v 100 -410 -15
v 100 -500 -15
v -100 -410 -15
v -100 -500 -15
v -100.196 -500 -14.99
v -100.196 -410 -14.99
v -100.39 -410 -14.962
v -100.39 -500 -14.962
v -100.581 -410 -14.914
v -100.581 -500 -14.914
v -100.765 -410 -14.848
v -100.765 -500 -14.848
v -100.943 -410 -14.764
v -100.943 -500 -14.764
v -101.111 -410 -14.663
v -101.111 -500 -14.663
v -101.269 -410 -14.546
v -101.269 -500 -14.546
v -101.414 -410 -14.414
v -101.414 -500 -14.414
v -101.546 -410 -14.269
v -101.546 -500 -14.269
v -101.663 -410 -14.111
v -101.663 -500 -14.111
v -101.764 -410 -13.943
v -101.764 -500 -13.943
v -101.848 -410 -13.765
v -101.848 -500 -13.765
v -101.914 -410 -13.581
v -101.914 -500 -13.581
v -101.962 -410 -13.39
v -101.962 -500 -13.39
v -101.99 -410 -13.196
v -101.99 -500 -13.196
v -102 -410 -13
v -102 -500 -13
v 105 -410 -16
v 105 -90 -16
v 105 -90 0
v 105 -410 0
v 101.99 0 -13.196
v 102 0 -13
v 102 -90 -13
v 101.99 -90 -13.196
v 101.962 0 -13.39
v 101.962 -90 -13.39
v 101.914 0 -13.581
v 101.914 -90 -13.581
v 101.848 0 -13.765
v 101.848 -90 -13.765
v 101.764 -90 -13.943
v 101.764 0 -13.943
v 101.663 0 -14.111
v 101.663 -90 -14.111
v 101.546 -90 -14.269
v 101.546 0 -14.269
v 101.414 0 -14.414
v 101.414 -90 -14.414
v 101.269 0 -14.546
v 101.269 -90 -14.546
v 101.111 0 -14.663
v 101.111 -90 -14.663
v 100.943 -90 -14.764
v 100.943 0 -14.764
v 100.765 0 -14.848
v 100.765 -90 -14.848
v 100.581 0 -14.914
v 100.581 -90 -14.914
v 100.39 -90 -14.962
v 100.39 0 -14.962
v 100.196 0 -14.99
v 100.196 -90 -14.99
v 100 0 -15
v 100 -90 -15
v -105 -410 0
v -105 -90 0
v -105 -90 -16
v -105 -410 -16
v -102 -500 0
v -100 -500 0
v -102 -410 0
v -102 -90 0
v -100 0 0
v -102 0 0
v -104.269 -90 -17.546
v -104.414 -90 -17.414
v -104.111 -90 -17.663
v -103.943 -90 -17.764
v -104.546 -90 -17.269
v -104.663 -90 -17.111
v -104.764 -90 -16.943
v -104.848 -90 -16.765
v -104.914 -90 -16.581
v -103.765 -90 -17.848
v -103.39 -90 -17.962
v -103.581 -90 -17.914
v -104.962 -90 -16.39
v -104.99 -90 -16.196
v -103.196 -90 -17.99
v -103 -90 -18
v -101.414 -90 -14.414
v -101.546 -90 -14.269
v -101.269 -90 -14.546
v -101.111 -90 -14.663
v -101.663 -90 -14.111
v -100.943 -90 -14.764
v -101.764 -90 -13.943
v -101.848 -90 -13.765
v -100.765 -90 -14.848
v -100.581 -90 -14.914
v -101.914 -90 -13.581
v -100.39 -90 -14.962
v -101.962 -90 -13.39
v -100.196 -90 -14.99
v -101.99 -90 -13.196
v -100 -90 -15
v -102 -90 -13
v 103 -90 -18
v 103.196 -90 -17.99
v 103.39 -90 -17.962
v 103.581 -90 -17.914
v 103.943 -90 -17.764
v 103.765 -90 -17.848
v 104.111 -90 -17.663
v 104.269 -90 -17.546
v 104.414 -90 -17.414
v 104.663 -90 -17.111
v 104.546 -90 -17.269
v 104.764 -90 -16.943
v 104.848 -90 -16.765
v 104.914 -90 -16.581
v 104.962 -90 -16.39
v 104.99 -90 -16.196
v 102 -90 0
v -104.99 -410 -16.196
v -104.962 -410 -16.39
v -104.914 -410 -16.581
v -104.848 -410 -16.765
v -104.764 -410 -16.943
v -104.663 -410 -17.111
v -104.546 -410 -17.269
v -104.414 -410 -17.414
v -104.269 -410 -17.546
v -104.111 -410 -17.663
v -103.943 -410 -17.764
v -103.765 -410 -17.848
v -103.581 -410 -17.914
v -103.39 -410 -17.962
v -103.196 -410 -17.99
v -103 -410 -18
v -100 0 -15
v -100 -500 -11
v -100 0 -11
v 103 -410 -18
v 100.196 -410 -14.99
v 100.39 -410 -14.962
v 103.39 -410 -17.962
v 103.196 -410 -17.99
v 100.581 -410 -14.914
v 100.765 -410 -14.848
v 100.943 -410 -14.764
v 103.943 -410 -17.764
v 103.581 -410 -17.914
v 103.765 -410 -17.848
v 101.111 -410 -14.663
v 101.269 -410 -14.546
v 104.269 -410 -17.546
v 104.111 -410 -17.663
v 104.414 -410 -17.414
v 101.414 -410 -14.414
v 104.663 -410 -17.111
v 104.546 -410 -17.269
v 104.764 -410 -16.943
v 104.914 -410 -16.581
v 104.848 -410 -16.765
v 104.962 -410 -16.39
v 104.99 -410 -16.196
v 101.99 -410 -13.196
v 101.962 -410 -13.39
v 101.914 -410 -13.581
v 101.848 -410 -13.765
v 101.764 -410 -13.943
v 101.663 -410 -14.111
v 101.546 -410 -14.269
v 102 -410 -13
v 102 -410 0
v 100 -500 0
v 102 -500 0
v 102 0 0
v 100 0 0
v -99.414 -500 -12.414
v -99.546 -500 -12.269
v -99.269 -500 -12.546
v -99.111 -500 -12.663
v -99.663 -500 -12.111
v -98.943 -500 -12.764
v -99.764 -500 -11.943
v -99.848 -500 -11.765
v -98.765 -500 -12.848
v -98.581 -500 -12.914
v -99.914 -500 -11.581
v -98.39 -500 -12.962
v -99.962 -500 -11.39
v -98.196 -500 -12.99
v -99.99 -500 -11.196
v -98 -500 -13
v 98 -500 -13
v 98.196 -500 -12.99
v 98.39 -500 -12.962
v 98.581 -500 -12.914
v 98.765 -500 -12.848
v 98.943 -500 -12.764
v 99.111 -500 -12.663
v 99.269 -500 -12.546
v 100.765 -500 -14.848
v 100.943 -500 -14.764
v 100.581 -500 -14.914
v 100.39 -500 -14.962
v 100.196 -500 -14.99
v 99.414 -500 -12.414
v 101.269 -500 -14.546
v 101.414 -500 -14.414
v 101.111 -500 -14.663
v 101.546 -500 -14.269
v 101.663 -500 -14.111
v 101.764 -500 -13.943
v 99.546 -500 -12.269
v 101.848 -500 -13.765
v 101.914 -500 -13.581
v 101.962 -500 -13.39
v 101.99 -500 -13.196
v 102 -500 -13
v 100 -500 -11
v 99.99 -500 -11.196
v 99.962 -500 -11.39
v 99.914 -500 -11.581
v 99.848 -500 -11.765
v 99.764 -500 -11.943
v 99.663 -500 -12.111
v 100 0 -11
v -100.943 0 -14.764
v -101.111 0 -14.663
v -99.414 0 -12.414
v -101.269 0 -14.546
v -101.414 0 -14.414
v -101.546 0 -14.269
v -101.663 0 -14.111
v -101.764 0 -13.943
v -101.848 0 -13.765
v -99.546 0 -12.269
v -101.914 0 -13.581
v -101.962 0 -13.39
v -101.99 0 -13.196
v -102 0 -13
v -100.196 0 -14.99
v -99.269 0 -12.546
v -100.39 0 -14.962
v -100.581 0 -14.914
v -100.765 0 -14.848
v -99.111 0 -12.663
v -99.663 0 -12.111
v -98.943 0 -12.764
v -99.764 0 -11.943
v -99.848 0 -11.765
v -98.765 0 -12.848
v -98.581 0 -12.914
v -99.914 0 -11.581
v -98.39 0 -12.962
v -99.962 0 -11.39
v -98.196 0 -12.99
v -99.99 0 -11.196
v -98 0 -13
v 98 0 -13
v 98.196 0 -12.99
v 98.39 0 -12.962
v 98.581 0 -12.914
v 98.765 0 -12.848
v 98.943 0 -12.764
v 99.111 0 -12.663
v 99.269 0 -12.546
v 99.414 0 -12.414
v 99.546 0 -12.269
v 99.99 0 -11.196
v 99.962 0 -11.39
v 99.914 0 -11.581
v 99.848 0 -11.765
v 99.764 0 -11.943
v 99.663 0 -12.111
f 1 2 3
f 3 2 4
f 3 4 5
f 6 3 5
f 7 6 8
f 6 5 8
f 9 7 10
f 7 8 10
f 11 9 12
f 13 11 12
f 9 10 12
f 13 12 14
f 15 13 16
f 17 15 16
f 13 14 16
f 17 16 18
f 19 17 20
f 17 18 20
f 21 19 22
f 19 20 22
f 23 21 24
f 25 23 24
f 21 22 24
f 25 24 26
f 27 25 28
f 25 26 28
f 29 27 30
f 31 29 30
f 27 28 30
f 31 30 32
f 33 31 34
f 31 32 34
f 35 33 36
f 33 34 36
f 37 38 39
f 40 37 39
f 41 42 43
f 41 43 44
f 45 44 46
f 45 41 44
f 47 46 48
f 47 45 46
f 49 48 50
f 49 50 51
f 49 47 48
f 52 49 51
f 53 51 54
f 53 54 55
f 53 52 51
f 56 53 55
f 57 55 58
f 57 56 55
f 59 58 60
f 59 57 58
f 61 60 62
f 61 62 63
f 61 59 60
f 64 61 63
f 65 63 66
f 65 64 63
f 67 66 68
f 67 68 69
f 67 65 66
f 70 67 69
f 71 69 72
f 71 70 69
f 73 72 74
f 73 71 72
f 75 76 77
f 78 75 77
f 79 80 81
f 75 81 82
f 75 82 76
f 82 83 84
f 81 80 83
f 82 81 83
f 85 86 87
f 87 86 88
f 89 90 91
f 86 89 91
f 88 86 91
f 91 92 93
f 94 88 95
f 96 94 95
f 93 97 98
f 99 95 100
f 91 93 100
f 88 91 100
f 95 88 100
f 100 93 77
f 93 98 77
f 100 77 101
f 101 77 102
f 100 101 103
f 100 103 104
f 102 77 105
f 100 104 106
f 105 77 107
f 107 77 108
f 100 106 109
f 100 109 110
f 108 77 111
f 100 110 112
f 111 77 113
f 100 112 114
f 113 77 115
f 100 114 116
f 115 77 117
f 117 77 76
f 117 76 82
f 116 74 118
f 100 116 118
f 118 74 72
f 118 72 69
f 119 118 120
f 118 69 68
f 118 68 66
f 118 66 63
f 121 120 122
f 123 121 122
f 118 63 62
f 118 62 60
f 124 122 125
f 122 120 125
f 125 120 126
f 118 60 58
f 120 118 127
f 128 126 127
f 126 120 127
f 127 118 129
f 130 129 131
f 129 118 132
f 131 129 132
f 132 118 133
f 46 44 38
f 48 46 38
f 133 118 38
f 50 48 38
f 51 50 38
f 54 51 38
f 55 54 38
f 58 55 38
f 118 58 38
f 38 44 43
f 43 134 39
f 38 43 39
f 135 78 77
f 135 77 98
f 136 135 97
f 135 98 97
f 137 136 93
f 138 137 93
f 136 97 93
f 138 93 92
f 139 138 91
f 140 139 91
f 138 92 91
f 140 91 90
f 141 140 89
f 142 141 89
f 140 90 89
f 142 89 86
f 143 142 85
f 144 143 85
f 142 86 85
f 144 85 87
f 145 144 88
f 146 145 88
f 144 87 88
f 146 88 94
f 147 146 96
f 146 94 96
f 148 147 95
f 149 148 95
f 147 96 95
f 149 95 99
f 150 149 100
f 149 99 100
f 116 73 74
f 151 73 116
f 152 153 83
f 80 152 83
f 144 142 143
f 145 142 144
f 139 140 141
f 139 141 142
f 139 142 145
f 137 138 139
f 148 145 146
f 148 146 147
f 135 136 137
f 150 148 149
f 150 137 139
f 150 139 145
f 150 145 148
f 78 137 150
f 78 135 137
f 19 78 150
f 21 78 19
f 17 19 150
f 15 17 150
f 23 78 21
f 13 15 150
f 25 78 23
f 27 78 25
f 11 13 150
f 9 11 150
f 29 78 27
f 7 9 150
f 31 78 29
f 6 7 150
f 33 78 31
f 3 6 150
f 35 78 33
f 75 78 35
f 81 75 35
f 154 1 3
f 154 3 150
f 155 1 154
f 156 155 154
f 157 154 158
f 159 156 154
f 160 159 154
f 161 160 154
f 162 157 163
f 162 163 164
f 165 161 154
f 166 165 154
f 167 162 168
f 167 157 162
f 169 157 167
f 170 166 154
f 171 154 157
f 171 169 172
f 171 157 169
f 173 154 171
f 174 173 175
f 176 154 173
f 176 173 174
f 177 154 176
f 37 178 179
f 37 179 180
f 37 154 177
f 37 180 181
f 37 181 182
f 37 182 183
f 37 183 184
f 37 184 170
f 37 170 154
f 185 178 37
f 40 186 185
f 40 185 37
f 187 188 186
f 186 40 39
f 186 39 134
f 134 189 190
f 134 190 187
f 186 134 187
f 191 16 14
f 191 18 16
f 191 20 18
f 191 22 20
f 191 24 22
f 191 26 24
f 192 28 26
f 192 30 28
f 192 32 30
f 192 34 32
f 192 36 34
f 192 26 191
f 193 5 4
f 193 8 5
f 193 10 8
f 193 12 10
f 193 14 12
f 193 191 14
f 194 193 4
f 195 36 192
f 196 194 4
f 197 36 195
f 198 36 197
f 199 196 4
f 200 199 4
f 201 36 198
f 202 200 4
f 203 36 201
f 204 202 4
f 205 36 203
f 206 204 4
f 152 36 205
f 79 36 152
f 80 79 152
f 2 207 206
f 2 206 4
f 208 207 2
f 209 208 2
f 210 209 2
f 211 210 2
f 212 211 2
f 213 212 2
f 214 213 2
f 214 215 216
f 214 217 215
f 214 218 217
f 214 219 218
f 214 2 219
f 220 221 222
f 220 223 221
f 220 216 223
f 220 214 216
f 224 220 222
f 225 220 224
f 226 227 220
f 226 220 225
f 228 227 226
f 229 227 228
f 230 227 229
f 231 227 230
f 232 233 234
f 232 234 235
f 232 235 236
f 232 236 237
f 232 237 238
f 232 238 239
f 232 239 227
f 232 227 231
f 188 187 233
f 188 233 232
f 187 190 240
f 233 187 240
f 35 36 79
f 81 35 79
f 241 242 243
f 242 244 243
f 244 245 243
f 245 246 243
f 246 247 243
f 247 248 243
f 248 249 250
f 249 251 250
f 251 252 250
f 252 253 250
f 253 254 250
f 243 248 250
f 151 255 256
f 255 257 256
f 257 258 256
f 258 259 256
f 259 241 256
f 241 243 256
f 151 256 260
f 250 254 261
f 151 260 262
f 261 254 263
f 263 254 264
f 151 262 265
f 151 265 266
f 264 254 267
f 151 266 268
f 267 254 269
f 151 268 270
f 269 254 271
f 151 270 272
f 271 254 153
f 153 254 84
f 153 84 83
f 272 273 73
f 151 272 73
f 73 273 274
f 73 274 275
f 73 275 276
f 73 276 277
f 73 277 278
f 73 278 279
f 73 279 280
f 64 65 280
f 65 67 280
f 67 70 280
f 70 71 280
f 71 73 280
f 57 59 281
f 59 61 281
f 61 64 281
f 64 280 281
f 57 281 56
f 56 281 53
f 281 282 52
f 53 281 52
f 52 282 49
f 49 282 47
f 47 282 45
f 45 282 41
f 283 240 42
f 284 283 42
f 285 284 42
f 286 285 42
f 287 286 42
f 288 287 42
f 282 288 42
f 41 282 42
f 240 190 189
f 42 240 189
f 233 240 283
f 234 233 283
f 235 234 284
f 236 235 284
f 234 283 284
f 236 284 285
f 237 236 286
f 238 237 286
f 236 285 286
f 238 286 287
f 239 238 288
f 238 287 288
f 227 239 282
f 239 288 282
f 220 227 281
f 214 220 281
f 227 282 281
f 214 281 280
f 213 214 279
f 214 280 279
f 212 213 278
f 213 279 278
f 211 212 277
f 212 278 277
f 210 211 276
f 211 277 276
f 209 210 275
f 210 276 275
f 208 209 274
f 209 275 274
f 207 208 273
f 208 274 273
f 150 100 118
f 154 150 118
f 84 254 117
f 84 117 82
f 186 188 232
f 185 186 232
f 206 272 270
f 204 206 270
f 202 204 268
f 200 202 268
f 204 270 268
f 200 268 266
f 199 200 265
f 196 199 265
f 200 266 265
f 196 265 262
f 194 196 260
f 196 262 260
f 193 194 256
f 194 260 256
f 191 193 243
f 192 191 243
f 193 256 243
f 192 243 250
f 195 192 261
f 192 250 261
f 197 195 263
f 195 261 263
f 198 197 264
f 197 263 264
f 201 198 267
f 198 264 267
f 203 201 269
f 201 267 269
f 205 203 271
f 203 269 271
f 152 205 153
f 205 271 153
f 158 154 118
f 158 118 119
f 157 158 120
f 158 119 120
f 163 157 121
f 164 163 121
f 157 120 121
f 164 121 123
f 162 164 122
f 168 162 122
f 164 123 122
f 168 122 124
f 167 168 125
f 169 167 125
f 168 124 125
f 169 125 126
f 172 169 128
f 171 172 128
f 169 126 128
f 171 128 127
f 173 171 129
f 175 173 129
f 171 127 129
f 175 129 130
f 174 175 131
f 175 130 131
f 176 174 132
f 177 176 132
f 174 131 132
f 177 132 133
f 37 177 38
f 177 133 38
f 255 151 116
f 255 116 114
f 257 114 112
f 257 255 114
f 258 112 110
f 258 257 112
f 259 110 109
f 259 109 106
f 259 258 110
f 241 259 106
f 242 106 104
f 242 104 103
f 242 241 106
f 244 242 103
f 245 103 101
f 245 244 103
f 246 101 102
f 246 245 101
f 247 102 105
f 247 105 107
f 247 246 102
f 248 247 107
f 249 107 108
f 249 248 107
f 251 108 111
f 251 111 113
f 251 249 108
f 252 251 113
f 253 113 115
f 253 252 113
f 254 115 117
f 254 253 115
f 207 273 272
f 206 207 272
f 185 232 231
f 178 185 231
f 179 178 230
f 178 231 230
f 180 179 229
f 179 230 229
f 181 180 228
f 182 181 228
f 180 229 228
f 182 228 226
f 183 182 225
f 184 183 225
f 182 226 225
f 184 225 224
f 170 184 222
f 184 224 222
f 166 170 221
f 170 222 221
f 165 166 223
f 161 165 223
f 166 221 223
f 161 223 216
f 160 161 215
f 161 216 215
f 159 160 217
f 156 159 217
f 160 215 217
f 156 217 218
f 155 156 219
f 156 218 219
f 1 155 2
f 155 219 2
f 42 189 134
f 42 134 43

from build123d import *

# Parameters (mm, degrees)
F1_DEPTH = 500
F2_DEPTH = 90


# Not quite as in the source:
# - a pattern or mirror of a feature is missing from the dataset's text; its kind, count and spacing are read off the source's solid


with BuildPart() as f1:
    # F0 (on Front) → F1 (new body)
    with BuildSketch(Plane.XZ):
        with BuildLine():
            Line((102, 0), (100, 0))
            Line((100, 0), (100, -11))
            ThreePointArc((100, -11), (99.4142135624, -12.4142135624), (98, -13))
            Line((98, -13), (0, -13))
            Line((0, -13), (-98, -13))
            ThreePointArc((-98, -13), (-99.4142135624, -12.4142135624), (-100, -11))
            Line((-100, -11), (-100, 0))
            Line((-100, 0), (-102, 0))
            Line((-102, 0), (-102, -13))
            ThreePointArc((-102, -13), (-101.4142135624, -14.4142135624), (-100, -15))
            Line((-100, -15), (100, -15))
            ThreePointArc((100, -15), (101.4142135624, -14.4142135624), (102, -13))
            Line((102, -13), (102, 0))
        make_face()
        with BuildLine():
            Line((105, 0), (102, 0))
            Line((102, 0), (102, -13))
            ThreePointArc((102, -13), (101.4142135624, -14.4142135624), (100, -15))
            Line((100, -15), (-100, -15))
            ThreePointArc((-100, -15), (-101.4142135624, -14.4142135624), (-102, -13))
            Line((-102, -13), (-102, 0))
            Line((-102, 0), (-105, 0))
            Line((-105, 0), (-105, -16))
            ThreePointArc((-105, -16), (-104.4142135624, -17.4142135624), (-103, -18))
            Line((-103, -18), (0, -18))
            Line((0, -18), (103, -18))
            ThreePointArc((103, -18), (104.4142135624, -17.4142135624), (105, -16))
            Line((105, -16), (105, 0))
        make_face()
    extrude(amount=F1_DEPTH)

    # F0 (on Front) → F2 (cut)
    with BuildSketch(Plane.XZ):
        with BuildLine():
            Line((105, 0), (102, 0))
            Line((102, 0), (102, -13))
            ThreePointArc((102, -13), (101.4142135624, -14.4142135624), (100, -15))
            Line((100, -15), (-100, -15))
            ThreePointArc((-100, -15), (-101.4142135624, -14.4142135624), (-102, -13))
            Line((-102, -13), (-102, 0))
            Line((-102, 0), (-105, 0))
            Line((-105, 0), (-105, -16))
            ThreePointArc((-105, -16), (-104.4142135624, -17.4142135624), (-103, -18))
            Line((-103, -18), (0, -18))
            Line((0, -18), (103, -18))
            ThreePointArc((103, -18), (104.4142135624, -17.4142135624), (105, -16))
            Line((105, -16), (105, 0))
        make_face()
    f2 = extrude(amount=F2_DEPTH, mode=Mode.SUBTRACT)

    # F2_copies: F2 across plane
    add(f2.mirror(Plane(origin=(0, -250, 0), x_dir=(0, 0, -1), z_dir=(0, -1, 0))), mode=Mode.SUBTRACT)


solid = f1.part
